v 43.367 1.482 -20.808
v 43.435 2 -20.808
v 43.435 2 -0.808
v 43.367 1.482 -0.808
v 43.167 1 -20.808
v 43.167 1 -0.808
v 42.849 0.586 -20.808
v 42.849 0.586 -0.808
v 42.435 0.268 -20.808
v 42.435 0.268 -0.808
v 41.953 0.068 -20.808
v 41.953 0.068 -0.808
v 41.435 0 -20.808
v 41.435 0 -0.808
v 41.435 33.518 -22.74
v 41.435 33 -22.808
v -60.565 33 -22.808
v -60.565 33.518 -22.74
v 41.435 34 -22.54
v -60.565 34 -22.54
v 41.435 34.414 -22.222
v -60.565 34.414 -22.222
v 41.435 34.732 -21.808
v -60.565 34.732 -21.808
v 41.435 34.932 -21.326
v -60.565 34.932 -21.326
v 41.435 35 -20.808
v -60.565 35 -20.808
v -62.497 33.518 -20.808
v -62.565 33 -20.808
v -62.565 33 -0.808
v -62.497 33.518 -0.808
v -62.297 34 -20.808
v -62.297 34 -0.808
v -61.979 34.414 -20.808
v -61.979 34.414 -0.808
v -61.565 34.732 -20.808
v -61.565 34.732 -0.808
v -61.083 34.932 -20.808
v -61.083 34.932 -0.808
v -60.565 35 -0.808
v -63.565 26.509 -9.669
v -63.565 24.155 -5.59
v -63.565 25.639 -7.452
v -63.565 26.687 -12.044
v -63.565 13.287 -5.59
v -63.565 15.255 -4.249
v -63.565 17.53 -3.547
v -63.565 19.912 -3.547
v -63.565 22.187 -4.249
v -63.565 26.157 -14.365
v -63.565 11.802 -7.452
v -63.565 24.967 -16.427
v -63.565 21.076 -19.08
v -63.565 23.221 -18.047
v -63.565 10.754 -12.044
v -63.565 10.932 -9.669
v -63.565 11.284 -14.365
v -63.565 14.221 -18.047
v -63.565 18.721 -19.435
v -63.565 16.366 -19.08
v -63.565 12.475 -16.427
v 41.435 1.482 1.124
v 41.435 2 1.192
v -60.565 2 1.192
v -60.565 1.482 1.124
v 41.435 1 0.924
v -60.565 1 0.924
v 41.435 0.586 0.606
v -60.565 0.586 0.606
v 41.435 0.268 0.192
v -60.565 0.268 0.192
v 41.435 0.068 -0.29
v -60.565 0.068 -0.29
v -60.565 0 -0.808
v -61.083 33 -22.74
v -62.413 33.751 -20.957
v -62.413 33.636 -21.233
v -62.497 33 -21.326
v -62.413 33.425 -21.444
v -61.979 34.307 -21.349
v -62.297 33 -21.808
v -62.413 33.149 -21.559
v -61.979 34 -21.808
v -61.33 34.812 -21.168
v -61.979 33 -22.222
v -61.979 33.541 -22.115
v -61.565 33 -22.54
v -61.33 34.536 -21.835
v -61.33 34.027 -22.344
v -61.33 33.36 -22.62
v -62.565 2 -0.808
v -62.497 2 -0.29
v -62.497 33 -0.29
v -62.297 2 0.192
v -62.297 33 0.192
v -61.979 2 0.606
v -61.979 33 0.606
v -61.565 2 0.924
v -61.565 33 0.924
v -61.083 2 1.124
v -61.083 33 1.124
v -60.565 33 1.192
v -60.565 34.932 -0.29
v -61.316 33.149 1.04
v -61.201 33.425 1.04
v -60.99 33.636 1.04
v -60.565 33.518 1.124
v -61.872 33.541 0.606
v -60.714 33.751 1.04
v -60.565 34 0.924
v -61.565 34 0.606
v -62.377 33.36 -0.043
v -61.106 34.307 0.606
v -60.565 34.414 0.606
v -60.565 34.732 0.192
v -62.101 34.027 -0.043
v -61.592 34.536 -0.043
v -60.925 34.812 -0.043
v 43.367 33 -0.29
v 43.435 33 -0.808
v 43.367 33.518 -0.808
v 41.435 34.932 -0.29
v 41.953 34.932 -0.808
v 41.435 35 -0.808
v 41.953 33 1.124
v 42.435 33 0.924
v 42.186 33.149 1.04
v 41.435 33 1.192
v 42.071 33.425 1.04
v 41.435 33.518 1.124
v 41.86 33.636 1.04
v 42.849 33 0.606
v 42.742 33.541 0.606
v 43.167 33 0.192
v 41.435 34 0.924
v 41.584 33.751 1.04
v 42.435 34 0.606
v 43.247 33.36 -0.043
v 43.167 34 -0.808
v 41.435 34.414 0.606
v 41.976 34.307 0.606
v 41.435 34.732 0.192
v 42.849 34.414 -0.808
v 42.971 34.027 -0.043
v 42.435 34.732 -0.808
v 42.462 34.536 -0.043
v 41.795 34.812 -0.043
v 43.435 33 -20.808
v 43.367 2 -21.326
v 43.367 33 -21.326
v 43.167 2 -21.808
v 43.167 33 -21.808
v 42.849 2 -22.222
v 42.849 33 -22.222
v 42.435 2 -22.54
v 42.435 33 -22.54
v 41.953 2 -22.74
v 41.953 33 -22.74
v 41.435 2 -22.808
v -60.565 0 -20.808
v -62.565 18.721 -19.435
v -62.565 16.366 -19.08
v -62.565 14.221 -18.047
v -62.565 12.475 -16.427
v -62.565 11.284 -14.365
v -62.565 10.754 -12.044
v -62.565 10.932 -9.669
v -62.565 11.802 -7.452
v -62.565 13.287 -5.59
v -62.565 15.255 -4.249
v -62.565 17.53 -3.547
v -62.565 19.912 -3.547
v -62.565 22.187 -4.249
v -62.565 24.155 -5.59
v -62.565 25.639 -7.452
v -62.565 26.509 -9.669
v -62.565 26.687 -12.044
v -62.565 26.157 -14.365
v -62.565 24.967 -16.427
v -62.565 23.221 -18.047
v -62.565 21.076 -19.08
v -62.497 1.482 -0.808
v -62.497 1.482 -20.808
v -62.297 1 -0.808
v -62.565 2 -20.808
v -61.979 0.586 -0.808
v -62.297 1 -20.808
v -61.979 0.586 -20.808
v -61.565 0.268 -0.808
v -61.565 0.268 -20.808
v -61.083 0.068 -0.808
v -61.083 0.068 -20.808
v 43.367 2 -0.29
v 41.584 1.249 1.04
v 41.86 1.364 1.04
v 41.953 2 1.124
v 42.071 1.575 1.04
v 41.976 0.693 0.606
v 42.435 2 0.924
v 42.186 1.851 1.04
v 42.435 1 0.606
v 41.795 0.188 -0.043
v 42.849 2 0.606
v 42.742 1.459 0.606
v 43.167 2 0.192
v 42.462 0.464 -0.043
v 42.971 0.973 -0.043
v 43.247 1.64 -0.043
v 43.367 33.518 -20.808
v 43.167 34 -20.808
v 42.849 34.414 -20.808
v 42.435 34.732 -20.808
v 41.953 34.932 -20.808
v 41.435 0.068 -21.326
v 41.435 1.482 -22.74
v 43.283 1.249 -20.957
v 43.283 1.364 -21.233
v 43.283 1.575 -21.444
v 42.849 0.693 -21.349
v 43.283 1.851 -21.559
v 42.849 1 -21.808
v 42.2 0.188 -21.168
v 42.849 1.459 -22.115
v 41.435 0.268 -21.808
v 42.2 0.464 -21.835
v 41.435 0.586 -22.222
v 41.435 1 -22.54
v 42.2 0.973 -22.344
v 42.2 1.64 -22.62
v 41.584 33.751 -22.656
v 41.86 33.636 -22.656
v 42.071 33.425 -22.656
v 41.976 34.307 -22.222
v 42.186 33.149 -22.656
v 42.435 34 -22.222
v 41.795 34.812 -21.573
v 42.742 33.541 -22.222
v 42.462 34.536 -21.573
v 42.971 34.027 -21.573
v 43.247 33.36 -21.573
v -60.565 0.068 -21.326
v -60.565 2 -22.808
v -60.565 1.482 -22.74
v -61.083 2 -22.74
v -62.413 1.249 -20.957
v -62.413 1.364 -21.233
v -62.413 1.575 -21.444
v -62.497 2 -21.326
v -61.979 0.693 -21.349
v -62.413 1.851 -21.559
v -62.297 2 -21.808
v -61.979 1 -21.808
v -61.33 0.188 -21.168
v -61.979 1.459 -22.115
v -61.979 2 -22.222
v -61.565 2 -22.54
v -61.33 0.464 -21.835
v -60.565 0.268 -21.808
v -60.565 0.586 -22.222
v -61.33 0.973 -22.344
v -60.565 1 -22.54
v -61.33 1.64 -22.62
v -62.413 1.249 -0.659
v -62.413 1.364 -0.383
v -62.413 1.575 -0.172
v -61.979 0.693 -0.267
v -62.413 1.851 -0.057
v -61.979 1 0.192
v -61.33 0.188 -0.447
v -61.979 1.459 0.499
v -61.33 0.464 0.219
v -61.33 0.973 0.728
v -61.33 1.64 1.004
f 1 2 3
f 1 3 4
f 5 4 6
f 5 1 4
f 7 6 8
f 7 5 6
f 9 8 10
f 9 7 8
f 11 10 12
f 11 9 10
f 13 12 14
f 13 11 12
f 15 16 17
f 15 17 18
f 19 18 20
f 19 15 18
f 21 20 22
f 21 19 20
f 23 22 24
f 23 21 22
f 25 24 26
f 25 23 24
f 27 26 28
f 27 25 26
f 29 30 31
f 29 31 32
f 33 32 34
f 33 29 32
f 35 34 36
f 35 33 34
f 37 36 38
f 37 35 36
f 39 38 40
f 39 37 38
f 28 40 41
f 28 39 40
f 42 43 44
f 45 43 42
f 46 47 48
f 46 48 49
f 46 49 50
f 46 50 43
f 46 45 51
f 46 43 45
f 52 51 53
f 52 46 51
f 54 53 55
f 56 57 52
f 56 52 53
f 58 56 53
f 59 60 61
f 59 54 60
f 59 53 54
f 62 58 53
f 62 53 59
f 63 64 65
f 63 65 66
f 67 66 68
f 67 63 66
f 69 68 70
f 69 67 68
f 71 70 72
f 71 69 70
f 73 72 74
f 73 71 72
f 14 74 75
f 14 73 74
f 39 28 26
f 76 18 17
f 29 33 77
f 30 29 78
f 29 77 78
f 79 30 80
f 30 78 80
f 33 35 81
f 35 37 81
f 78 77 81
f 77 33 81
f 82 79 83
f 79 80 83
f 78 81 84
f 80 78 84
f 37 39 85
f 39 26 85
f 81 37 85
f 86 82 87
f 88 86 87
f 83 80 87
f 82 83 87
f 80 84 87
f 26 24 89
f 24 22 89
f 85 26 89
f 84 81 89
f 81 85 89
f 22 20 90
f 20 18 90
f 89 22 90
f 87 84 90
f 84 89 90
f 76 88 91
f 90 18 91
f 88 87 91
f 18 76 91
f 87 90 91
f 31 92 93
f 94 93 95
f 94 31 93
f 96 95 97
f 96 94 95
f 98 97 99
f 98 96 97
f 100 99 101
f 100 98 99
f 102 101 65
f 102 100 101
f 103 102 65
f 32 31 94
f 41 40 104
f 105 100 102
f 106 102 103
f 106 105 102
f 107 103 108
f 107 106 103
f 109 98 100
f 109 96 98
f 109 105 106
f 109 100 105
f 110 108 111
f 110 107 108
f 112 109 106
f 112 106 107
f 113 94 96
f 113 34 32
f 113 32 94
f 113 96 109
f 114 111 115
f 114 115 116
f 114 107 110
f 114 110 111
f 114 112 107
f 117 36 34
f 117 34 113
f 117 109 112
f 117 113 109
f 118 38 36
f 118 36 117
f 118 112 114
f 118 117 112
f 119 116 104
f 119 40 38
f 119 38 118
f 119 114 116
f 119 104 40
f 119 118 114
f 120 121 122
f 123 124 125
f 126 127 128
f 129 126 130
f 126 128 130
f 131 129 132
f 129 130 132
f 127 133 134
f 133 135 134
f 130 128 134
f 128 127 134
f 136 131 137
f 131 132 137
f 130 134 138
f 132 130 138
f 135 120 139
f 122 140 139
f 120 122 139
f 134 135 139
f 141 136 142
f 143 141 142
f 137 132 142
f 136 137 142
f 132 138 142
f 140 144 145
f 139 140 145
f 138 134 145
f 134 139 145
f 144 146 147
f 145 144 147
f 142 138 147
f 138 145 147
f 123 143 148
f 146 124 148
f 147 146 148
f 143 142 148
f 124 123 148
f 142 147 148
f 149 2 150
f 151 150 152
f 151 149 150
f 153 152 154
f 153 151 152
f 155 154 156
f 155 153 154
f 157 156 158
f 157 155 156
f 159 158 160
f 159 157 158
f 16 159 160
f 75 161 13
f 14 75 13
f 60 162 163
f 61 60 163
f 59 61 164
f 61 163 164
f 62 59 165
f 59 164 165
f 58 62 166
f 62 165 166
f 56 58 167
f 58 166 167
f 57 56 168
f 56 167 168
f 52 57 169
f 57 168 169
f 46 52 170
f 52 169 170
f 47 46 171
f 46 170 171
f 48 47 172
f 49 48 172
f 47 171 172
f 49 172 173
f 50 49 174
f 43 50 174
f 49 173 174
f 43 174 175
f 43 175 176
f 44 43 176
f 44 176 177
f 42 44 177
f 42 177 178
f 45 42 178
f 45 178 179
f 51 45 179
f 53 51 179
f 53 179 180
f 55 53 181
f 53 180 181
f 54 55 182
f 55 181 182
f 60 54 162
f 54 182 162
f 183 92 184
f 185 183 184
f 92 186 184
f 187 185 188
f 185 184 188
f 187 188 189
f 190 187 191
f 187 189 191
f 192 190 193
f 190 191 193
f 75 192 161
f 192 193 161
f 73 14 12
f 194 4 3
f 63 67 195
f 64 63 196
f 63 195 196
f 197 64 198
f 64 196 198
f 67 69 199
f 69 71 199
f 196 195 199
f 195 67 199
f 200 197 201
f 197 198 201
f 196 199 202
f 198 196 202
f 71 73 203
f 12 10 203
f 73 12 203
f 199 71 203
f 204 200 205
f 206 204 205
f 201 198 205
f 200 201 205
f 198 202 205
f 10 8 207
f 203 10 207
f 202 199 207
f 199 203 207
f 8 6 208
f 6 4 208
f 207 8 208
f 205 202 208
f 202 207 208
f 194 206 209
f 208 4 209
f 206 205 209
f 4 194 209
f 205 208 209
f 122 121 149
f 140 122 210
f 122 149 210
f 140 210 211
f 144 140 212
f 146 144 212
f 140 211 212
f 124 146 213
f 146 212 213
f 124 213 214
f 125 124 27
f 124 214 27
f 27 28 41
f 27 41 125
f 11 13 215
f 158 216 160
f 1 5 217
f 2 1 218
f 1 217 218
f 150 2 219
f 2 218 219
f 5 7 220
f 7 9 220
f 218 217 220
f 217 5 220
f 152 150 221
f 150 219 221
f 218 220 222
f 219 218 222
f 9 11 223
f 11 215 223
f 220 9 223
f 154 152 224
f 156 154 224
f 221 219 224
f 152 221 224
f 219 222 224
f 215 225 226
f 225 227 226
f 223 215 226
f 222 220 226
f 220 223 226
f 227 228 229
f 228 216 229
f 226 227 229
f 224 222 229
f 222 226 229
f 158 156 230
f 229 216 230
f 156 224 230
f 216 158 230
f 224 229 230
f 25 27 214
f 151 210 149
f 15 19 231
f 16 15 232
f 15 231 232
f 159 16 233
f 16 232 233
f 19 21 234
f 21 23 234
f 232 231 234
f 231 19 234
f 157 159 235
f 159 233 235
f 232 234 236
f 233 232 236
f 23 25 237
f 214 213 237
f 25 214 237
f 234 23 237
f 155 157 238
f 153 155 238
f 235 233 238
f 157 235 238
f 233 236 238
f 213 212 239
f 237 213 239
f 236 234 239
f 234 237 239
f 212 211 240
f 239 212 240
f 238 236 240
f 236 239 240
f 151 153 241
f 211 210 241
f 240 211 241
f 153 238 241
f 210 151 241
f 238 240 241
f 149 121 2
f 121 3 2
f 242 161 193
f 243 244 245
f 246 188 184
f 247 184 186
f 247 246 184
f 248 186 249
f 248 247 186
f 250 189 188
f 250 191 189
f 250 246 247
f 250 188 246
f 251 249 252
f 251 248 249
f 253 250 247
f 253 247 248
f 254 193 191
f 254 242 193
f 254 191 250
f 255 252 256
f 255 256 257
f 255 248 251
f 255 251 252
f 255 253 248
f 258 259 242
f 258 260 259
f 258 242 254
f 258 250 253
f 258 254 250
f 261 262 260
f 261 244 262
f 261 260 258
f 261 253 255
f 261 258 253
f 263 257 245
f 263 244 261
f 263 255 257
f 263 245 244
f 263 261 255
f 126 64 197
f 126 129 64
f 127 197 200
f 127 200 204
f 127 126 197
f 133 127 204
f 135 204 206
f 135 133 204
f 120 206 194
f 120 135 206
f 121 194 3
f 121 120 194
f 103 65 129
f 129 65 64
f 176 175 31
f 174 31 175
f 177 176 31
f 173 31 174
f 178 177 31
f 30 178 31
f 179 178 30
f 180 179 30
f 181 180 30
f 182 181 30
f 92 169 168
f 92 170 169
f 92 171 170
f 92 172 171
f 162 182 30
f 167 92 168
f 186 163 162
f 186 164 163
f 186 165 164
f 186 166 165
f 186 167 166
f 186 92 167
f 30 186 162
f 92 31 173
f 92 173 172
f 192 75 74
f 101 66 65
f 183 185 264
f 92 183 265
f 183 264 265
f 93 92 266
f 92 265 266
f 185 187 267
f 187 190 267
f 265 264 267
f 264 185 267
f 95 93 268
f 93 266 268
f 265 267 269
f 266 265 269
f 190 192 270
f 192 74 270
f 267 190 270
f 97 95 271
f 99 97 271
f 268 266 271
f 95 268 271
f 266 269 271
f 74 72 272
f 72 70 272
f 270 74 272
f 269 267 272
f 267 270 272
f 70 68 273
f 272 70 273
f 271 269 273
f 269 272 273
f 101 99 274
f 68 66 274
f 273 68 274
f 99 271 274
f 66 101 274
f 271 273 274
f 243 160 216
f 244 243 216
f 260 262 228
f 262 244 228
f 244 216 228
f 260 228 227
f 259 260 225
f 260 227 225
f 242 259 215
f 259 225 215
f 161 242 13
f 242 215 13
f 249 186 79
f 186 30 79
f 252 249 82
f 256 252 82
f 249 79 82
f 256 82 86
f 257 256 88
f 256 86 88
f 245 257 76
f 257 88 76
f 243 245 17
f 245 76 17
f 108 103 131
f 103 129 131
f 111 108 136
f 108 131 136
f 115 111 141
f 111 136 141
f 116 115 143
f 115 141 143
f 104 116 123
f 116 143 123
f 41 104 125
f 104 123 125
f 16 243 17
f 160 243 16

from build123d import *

# Parameters (mm, degrees)
SKETCH1_W           = 106
SKETCH1_H           = 24
BOSS_EXTRUDE1_DEPTH = 35
FILLET1_R           = 2
SKETCH2_R           = 7.98880999
BOSS_EXTRUDE2_DEPTH = 1


with BuildPart() as part:
    # Sketch1 → Boss-Extrude1 (new body)
    with BuildSketch(Plane(origin=(0, 0, 0), x_dir=(1, 0, 0), z_dir=(0, 1, 0))):
        with Locations((-9.565003902, 10.807978011)):
            Rectangle(SKETCH1_W, SKETCH1_H)
    extrude(amount=BOSS_EXTRUDE1_DEPTH)

    # Fillet1
    fillet1_edges = [part.edges().sort_by_distance(p)[0] for p in [
        (43.434996098, 35, -10.807978011),
        (-9.565003902, 35, -22.807978011),
        (-62.565003902, 35, -10.807978011),
        (-9.565003902, 0, -22.807978011),
        (43.434996098, 0, -10.807978011),
        (-9.565003902, 0, 1.192021989),
        (-62.565003902, 0, -10.807978011),
        (-62.565003902, 17.5, -22.807978011),
        (43.434996098, 17.5, -22.807978011),
        (43.434996098, 17.5, 1.192021989),
        (-62.565003902, 17.5, 1.192021989),
        (-9.565003902, 35, 1.192021989),
    ]]
    fillet(fillet1_edges, radius=FILLET1_R)

    # Sketch2 → Boss-Extrude2 (add)
    with BuildSketch(Plane.ZY.offset(62.565003902)):
        with Locations(Location((-11.446505624, 18.72084807, 0), (0, 0, 180))):
            Circle(SKETCH2_R)
    extrude(amount=BOSS_EXTRUDE2_DEPTH)


solid = part.part
